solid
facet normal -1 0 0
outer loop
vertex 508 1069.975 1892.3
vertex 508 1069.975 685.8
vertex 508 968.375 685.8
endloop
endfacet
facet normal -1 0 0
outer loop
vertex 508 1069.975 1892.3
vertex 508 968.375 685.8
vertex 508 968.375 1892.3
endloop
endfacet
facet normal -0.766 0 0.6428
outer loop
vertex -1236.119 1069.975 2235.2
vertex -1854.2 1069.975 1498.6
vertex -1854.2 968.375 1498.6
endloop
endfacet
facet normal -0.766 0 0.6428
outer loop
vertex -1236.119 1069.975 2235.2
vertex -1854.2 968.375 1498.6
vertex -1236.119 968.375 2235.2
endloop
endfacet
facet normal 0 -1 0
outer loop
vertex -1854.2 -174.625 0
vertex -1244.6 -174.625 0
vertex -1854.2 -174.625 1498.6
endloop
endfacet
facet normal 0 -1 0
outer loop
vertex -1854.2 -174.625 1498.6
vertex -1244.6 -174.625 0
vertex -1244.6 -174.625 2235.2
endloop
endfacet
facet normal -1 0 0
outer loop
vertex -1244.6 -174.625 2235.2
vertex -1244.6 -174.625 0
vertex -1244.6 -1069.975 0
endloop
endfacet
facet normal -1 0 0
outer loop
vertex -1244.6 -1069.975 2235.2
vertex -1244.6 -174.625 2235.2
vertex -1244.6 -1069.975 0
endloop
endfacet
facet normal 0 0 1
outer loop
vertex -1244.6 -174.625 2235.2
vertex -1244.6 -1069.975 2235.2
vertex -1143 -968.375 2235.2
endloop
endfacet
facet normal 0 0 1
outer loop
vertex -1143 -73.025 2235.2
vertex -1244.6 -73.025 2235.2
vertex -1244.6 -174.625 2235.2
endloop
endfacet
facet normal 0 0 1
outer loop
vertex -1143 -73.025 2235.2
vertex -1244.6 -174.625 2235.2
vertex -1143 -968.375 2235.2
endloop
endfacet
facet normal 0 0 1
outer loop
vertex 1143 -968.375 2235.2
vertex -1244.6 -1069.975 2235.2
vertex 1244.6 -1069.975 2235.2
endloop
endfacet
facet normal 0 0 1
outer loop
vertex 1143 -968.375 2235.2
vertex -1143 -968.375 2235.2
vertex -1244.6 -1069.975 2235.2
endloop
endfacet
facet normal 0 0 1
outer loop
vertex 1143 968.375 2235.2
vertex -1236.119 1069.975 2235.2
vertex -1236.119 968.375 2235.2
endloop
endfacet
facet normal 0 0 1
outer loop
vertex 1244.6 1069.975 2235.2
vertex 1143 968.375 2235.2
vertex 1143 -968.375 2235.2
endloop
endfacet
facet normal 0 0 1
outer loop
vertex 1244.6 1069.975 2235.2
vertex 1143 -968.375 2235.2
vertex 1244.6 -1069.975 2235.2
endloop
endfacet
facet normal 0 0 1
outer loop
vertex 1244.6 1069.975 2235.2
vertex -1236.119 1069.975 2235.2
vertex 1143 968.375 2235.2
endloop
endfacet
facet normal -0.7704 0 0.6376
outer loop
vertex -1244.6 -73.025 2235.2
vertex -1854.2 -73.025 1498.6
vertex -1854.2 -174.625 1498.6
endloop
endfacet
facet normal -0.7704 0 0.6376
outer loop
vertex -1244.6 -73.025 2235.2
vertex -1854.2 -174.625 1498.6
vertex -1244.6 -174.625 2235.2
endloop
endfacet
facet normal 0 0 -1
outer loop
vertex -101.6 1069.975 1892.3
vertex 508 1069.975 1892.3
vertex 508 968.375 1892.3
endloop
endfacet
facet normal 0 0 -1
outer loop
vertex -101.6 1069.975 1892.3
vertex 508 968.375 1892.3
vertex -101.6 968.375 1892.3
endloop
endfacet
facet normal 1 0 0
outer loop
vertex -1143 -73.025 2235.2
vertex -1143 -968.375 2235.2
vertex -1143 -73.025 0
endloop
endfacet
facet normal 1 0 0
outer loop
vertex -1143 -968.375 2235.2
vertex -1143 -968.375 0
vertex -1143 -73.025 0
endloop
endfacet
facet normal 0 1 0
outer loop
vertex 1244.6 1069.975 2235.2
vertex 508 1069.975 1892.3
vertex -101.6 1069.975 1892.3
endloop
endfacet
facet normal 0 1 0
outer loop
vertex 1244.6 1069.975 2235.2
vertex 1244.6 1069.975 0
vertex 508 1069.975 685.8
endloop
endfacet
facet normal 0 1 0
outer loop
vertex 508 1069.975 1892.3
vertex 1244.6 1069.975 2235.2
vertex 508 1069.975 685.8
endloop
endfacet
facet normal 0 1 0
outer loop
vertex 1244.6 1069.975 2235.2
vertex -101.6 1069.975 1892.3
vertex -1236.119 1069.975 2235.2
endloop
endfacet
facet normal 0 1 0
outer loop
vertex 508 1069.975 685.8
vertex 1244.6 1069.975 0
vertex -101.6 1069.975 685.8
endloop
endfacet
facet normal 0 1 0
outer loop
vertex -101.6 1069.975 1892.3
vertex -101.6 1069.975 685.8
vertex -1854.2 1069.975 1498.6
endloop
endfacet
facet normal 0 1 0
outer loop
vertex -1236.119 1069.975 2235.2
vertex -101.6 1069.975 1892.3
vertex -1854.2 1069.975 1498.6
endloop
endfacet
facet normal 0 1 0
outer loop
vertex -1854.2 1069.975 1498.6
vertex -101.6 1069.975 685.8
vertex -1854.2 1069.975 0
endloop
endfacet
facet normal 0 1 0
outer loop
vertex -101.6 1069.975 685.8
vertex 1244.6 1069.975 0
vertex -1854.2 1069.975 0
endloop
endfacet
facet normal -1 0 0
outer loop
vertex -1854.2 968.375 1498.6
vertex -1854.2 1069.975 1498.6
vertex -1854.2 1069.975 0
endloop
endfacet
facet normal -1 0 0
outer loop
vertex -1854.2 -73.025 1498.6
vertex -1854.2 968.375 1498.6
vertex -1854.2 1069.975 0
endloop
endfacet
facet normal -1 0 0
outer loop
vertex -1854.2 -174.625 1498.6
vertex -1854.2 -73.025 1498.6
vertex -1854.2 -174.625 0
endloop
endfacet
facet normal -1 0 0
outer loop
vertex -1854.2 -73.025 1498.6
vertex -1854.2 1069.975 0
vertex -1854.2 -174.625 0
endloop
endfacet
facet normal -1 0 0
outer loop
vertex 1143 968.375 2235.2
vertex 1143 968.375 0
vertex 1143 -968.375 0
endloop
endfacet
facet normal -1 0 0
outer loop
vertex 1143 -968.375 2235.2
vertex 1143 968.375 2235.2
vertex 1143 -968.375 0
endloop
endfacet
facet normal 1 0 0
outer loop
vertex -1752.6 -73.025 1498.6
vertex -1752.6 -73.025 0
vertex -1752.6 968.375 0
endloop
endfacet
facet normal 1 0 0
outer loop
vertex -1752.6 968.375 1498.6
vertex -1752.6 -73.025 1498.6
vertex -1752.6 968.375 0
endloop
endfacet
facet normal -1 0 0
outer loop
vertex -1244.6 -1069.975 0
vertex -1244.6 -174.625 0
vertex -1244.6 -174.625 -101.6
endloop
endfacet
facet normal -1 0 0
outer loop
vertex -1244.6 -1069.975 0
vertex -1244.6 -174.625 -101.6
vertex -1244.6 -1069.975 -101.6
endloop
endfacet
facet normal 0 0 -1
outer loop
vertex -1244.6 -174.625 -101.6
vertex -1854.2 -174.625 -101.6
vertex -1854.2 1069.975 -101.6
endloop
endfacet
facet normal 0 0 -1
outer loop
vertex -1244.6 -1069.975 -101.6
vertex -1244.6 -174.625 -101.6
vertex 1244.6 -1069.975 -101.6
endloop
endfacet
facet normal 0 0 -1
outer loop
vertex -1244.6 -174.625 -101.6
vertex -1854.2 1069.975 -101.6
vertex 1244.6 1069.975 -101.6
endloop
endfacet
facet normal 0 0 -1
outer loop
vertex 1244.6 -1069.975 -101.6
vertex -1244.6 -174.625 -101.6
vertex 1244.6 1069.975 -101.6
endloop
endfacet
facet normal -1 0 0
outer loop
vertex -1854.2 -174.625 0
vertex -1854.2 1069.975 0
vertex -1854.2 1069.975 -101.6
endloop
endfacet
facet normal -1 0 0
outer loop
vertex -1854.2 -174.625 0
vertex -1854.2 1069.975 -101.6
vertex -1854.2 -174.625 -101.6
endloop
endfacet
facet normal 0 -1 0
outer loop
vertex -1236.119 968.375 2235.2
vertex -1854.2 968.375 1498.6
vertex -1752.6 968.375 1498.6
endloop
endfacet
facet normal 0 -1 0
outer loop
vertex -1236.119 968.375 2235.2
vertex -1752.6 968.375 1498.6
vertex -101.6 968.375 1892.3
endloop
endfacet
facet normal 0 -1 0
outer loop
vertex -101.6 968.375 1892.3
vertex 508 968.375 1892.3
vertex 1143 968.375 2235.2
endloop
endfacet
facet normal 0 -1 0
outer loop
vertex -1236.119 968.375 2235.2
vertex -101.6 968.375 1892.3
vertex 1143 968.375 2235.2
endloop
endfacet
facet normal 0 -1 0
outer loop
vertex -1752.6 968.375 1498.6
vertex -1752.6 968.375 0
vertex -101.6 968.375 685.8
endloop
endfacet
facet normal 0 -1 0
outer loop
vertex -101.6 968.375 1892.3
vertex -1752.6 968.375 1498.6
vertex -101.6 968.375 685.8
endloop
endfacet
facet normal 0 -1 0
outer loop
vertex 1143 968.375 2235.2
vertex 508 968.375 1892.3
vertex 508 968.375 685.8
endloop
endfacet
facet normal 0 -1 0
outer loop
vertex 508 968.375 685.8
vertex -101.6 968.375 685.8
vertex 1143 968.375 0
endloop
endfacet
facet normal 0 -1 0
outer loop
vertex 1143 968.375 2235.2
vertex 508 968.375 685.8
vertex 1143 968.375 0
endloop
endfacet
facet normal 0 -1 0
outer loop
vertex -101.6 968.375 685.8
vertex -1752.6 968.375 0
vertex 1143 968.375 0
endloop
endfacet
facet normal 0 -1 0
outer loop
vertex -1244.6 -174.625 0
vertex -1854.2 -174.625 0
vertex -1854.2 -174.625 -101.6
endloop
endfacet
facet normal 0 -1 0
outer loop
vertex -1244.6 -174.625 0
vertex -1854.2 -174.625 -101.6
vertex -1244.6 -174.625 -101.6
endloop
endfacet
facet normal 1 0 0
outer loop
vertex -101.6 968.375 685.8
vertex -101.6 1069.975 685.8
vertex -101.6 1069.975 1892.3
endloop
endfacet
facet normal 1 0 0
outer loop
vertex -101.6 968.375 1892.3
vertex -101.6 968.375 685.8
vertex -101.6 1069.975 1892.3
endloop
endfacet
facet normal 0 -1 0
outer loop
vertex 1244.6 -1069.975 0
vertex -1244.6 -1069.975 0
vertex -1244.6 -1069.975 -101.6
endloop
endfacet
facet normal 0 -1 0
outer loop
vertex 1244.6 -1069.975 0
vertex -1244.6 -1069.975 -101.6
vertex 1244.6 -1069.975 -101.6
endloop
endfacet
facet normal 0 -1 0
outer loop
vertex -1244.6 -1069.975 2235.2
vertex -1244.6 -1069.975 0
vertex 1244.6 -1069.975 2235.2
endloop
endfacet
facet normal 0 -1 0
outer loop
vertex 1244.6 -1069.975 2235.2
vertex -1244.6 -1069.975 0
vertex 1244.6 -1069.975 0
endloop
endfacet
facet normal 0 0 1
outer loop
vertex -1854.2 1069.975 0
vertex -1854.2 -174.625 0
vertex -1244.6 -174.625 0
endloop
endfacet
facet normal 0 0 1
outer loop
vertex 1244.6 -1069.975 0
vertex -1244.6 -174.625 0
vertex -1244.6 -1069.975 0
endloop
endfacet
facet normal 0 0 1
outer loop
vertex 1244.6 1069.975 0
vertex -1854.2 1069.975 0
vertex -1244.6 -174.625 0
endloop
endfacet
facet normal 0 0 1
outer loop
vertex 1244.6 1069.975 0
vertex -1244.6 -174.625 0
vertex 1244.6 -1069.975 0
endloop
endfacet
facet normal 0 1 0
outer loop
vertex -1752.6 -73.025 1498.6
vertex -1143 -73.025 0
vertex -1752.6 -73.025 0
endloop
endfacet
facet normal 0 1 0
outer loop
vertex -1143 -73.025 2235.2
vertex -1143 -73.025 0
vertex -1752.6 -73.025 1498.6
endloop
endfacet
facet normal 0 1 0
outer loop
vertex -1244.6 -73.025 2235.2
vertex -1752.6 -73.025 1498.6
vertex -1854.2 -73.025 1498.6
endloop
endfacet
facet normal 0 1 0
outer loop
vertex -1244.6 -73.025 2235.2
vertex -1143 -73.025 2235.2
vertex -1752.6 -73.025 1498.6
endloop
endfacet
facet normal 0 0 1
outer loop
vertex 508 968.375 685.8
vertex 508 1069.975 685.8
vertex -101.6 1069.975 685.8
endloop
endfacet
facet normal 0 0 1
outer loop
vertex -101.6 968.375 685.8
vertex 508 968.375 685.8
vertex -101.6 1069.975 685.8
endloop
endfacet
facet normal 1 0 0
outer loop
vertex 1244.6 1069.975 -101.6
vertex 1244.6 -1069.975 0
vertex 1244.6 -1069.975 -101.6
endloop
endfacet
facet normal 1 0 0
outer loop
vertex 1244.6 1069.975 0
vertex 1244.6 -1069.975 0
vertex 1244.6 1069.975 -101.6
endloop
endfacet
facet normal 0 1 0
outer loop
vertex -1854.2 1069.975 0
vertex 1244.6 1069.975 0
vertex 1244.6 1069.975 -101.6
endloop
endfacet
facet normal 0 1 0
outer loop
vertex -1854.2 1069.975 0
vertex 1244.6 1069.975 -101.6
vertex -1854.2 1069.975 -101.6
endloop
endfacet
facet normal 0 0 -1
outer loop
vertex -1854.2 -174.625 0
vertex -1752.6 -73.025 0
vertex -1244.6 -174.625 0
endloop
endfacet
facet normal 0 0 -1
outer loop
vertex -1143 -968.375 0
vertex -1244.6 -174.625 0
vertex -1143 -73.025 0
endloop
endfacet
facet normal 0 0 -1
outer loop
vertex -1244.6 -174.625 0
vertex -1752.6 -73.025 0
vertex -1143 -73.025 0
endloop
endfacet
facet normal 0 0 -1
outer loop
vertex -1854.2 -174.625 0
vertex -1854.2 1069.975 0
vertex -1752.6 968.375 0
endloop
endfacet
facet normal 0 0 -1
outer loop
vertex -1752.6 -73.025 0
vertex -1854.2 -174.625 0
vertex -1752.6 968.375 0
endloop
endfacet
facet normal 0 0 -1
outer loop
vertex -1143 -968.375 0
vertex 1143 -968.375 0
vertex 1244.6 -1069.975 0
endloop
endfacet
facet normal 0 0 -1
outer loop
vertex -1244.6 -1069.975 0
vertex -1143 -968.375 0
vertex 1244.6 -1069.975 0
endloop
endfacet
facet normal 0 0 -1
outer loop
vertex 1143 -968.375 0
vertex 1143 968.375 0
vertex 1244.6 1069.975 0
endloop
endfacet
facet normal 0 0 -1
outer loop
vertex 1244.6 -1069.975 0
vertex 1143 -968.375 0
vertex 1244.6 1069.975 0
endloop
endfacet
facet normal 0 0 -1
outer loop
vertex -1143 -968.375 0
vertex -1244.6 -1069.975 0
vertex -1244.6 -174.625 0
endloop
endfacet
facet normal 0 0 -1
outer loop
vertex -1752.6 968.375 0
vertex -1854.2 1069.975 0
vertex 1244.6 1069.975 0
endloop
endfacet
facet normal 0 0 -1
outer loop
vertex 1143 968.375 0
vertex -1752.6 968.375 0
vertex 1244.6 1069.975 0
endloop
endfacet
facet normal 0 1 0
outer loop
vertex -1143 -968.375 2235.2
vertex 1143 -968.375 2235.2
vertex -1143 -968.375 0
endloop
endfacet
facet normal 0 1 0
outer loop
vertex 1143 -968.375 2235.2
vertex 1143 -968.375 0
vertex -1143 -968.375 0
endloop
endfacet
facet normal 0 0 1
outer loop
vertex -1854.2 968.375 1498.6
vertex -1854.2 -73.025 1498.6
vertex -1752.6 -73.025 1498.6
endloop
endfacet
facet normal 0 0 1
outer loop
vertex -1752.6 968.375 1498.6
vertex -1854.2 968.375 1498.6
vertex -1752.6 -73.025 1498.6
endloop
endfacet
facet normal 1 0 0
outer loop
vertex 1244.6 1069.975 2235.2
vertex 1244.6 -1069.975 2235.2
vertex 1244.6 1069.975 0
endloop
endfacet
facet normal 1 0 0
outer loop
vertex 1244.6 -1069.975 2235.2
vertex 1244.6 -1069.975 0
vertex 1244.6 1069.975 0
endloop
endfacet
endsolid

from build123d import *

# Parameters (mm, degrees)
F1_DEPTH  = 1498.6
F2_W      = 3098.8
F2_H      = 1498.6
F3_DEPTH  = 101.6
F5_DEPTH  = 736.6
F7_DEPTH  = 101.6
F8_W      = 609.6
F8_H      = 1206.5
F9_DEPTH  = 101.6
F0_W      = 609.6
F0_H      = 1041.4
F10_DEPTH = 101.6


with BuildPart() as f1:
    # F0 (on Top) → F1 (new body)
    with BuildSketch(Plane.XY):
        Polygon((-1854.2, -174.625), (-1244.6, -174.625), (-1244.6, -1069.975), (1244.6, -1069.975), (1244.6, 1069.975), (-1143, 1069.975), (-1854.2, 1069.975), align=None)
        Polygon((1143, 968.375), (1143, -968.375), (-1143, -968.375), (-1143, -73.025), (-1752.6, -73.025), (-1752.6, 968.375), (-1143, 968.375), align=None, mode=Mode.SUBTRACT)
    extrude(amount=F1_DEPTH)

    # F2 (on face) → F3 (join)
    with BuildSketch(Plane(origin=(0, 1069.975, 0), x_dir=(-1, 0, 0), z_dir=(0, 1, 0))):
        with Locations((304.8, 749.3)):
            Rectangle(F2_W, F2_H)
        Polygon((-1244.6, 2235.2), (-1244.6, 1498.6), (1854.2, 1498.6), (1236.1192116748, 2235.2), align=None)
    extrude(amount=-F3_DEPTH)

    # F4 (on face) → F5 (join, through all)
    with BuildSketch(Plane.XY.offset(1498.6)):
        Polygon((-1244.6, -174.625), (-1244.6, -1069.975), (1244.6, -1069.975), (1244.6, 968.375), (1143, 968.375), (1143, -968.375), (-1143, -968.375), (-1143, -73.025), (-1244.6, -73.025), align=None)
    extrude(amount=F5_DEPTH)

    # F6 (on face) → F7 (join)
    with BuildSketch(Plane(origin=(0, -73.025, 0), x_dir=(-1, 0, 0), z_dir=(0, 1, 0))):
        Polygon((1244.6, 2235.2), (1244.6, 1498.6), (1752.6, 1498.6), (1854.2, 1498.6), align=None)
    extrude(amount=-F7_DEPTH)

    # F8 (on face) → F9 (cut)
    with BuildSketch(Plane(origin=(0, 1069.975, 0), x_dir=(-1, 0, 0), z_dir=(0, 1, 0))):
        with Locations((-203.2, 1289.05)):
            Rectangle(F8_W, F8_H)
    extrude(amount=-F9_DEPTH, mode=Mode.SUBTRACT)


with BuildPart() as f10:
    # F0 (on Top) → F10 (new body)
    with BuildSketch(Plane.XY):
        Polygon((-1854.2, -174.625), (-1244.6, -174.625), (-1244.6, -1069.975), (1244.6, -1069.975), (1244.6, 1069.975), (-1143, 1069.975), (-1854.2, 1069.975), align=None)
        Polygon((1143, 968.375), (1143, -968.375), (-1143, -968.375), (-1143, -73.025), (-1752.6, -73.025), (-1752.6, 968.375), (-1143, 968.375), align=None, mode=Mode.SUBTRACT)
        Polygon((-1143, -968.375), (1143, -968.375), (1143, 968.375), (-1143, 968.375), (-1143, -73.025), align=None)
        with Locations((-1447.8, 447.675)):
            Rectangle(F0_W, F0_H)
    extrude(amount=-F10_DEPTH)


solid = Compound([f1.part, f10.part])
